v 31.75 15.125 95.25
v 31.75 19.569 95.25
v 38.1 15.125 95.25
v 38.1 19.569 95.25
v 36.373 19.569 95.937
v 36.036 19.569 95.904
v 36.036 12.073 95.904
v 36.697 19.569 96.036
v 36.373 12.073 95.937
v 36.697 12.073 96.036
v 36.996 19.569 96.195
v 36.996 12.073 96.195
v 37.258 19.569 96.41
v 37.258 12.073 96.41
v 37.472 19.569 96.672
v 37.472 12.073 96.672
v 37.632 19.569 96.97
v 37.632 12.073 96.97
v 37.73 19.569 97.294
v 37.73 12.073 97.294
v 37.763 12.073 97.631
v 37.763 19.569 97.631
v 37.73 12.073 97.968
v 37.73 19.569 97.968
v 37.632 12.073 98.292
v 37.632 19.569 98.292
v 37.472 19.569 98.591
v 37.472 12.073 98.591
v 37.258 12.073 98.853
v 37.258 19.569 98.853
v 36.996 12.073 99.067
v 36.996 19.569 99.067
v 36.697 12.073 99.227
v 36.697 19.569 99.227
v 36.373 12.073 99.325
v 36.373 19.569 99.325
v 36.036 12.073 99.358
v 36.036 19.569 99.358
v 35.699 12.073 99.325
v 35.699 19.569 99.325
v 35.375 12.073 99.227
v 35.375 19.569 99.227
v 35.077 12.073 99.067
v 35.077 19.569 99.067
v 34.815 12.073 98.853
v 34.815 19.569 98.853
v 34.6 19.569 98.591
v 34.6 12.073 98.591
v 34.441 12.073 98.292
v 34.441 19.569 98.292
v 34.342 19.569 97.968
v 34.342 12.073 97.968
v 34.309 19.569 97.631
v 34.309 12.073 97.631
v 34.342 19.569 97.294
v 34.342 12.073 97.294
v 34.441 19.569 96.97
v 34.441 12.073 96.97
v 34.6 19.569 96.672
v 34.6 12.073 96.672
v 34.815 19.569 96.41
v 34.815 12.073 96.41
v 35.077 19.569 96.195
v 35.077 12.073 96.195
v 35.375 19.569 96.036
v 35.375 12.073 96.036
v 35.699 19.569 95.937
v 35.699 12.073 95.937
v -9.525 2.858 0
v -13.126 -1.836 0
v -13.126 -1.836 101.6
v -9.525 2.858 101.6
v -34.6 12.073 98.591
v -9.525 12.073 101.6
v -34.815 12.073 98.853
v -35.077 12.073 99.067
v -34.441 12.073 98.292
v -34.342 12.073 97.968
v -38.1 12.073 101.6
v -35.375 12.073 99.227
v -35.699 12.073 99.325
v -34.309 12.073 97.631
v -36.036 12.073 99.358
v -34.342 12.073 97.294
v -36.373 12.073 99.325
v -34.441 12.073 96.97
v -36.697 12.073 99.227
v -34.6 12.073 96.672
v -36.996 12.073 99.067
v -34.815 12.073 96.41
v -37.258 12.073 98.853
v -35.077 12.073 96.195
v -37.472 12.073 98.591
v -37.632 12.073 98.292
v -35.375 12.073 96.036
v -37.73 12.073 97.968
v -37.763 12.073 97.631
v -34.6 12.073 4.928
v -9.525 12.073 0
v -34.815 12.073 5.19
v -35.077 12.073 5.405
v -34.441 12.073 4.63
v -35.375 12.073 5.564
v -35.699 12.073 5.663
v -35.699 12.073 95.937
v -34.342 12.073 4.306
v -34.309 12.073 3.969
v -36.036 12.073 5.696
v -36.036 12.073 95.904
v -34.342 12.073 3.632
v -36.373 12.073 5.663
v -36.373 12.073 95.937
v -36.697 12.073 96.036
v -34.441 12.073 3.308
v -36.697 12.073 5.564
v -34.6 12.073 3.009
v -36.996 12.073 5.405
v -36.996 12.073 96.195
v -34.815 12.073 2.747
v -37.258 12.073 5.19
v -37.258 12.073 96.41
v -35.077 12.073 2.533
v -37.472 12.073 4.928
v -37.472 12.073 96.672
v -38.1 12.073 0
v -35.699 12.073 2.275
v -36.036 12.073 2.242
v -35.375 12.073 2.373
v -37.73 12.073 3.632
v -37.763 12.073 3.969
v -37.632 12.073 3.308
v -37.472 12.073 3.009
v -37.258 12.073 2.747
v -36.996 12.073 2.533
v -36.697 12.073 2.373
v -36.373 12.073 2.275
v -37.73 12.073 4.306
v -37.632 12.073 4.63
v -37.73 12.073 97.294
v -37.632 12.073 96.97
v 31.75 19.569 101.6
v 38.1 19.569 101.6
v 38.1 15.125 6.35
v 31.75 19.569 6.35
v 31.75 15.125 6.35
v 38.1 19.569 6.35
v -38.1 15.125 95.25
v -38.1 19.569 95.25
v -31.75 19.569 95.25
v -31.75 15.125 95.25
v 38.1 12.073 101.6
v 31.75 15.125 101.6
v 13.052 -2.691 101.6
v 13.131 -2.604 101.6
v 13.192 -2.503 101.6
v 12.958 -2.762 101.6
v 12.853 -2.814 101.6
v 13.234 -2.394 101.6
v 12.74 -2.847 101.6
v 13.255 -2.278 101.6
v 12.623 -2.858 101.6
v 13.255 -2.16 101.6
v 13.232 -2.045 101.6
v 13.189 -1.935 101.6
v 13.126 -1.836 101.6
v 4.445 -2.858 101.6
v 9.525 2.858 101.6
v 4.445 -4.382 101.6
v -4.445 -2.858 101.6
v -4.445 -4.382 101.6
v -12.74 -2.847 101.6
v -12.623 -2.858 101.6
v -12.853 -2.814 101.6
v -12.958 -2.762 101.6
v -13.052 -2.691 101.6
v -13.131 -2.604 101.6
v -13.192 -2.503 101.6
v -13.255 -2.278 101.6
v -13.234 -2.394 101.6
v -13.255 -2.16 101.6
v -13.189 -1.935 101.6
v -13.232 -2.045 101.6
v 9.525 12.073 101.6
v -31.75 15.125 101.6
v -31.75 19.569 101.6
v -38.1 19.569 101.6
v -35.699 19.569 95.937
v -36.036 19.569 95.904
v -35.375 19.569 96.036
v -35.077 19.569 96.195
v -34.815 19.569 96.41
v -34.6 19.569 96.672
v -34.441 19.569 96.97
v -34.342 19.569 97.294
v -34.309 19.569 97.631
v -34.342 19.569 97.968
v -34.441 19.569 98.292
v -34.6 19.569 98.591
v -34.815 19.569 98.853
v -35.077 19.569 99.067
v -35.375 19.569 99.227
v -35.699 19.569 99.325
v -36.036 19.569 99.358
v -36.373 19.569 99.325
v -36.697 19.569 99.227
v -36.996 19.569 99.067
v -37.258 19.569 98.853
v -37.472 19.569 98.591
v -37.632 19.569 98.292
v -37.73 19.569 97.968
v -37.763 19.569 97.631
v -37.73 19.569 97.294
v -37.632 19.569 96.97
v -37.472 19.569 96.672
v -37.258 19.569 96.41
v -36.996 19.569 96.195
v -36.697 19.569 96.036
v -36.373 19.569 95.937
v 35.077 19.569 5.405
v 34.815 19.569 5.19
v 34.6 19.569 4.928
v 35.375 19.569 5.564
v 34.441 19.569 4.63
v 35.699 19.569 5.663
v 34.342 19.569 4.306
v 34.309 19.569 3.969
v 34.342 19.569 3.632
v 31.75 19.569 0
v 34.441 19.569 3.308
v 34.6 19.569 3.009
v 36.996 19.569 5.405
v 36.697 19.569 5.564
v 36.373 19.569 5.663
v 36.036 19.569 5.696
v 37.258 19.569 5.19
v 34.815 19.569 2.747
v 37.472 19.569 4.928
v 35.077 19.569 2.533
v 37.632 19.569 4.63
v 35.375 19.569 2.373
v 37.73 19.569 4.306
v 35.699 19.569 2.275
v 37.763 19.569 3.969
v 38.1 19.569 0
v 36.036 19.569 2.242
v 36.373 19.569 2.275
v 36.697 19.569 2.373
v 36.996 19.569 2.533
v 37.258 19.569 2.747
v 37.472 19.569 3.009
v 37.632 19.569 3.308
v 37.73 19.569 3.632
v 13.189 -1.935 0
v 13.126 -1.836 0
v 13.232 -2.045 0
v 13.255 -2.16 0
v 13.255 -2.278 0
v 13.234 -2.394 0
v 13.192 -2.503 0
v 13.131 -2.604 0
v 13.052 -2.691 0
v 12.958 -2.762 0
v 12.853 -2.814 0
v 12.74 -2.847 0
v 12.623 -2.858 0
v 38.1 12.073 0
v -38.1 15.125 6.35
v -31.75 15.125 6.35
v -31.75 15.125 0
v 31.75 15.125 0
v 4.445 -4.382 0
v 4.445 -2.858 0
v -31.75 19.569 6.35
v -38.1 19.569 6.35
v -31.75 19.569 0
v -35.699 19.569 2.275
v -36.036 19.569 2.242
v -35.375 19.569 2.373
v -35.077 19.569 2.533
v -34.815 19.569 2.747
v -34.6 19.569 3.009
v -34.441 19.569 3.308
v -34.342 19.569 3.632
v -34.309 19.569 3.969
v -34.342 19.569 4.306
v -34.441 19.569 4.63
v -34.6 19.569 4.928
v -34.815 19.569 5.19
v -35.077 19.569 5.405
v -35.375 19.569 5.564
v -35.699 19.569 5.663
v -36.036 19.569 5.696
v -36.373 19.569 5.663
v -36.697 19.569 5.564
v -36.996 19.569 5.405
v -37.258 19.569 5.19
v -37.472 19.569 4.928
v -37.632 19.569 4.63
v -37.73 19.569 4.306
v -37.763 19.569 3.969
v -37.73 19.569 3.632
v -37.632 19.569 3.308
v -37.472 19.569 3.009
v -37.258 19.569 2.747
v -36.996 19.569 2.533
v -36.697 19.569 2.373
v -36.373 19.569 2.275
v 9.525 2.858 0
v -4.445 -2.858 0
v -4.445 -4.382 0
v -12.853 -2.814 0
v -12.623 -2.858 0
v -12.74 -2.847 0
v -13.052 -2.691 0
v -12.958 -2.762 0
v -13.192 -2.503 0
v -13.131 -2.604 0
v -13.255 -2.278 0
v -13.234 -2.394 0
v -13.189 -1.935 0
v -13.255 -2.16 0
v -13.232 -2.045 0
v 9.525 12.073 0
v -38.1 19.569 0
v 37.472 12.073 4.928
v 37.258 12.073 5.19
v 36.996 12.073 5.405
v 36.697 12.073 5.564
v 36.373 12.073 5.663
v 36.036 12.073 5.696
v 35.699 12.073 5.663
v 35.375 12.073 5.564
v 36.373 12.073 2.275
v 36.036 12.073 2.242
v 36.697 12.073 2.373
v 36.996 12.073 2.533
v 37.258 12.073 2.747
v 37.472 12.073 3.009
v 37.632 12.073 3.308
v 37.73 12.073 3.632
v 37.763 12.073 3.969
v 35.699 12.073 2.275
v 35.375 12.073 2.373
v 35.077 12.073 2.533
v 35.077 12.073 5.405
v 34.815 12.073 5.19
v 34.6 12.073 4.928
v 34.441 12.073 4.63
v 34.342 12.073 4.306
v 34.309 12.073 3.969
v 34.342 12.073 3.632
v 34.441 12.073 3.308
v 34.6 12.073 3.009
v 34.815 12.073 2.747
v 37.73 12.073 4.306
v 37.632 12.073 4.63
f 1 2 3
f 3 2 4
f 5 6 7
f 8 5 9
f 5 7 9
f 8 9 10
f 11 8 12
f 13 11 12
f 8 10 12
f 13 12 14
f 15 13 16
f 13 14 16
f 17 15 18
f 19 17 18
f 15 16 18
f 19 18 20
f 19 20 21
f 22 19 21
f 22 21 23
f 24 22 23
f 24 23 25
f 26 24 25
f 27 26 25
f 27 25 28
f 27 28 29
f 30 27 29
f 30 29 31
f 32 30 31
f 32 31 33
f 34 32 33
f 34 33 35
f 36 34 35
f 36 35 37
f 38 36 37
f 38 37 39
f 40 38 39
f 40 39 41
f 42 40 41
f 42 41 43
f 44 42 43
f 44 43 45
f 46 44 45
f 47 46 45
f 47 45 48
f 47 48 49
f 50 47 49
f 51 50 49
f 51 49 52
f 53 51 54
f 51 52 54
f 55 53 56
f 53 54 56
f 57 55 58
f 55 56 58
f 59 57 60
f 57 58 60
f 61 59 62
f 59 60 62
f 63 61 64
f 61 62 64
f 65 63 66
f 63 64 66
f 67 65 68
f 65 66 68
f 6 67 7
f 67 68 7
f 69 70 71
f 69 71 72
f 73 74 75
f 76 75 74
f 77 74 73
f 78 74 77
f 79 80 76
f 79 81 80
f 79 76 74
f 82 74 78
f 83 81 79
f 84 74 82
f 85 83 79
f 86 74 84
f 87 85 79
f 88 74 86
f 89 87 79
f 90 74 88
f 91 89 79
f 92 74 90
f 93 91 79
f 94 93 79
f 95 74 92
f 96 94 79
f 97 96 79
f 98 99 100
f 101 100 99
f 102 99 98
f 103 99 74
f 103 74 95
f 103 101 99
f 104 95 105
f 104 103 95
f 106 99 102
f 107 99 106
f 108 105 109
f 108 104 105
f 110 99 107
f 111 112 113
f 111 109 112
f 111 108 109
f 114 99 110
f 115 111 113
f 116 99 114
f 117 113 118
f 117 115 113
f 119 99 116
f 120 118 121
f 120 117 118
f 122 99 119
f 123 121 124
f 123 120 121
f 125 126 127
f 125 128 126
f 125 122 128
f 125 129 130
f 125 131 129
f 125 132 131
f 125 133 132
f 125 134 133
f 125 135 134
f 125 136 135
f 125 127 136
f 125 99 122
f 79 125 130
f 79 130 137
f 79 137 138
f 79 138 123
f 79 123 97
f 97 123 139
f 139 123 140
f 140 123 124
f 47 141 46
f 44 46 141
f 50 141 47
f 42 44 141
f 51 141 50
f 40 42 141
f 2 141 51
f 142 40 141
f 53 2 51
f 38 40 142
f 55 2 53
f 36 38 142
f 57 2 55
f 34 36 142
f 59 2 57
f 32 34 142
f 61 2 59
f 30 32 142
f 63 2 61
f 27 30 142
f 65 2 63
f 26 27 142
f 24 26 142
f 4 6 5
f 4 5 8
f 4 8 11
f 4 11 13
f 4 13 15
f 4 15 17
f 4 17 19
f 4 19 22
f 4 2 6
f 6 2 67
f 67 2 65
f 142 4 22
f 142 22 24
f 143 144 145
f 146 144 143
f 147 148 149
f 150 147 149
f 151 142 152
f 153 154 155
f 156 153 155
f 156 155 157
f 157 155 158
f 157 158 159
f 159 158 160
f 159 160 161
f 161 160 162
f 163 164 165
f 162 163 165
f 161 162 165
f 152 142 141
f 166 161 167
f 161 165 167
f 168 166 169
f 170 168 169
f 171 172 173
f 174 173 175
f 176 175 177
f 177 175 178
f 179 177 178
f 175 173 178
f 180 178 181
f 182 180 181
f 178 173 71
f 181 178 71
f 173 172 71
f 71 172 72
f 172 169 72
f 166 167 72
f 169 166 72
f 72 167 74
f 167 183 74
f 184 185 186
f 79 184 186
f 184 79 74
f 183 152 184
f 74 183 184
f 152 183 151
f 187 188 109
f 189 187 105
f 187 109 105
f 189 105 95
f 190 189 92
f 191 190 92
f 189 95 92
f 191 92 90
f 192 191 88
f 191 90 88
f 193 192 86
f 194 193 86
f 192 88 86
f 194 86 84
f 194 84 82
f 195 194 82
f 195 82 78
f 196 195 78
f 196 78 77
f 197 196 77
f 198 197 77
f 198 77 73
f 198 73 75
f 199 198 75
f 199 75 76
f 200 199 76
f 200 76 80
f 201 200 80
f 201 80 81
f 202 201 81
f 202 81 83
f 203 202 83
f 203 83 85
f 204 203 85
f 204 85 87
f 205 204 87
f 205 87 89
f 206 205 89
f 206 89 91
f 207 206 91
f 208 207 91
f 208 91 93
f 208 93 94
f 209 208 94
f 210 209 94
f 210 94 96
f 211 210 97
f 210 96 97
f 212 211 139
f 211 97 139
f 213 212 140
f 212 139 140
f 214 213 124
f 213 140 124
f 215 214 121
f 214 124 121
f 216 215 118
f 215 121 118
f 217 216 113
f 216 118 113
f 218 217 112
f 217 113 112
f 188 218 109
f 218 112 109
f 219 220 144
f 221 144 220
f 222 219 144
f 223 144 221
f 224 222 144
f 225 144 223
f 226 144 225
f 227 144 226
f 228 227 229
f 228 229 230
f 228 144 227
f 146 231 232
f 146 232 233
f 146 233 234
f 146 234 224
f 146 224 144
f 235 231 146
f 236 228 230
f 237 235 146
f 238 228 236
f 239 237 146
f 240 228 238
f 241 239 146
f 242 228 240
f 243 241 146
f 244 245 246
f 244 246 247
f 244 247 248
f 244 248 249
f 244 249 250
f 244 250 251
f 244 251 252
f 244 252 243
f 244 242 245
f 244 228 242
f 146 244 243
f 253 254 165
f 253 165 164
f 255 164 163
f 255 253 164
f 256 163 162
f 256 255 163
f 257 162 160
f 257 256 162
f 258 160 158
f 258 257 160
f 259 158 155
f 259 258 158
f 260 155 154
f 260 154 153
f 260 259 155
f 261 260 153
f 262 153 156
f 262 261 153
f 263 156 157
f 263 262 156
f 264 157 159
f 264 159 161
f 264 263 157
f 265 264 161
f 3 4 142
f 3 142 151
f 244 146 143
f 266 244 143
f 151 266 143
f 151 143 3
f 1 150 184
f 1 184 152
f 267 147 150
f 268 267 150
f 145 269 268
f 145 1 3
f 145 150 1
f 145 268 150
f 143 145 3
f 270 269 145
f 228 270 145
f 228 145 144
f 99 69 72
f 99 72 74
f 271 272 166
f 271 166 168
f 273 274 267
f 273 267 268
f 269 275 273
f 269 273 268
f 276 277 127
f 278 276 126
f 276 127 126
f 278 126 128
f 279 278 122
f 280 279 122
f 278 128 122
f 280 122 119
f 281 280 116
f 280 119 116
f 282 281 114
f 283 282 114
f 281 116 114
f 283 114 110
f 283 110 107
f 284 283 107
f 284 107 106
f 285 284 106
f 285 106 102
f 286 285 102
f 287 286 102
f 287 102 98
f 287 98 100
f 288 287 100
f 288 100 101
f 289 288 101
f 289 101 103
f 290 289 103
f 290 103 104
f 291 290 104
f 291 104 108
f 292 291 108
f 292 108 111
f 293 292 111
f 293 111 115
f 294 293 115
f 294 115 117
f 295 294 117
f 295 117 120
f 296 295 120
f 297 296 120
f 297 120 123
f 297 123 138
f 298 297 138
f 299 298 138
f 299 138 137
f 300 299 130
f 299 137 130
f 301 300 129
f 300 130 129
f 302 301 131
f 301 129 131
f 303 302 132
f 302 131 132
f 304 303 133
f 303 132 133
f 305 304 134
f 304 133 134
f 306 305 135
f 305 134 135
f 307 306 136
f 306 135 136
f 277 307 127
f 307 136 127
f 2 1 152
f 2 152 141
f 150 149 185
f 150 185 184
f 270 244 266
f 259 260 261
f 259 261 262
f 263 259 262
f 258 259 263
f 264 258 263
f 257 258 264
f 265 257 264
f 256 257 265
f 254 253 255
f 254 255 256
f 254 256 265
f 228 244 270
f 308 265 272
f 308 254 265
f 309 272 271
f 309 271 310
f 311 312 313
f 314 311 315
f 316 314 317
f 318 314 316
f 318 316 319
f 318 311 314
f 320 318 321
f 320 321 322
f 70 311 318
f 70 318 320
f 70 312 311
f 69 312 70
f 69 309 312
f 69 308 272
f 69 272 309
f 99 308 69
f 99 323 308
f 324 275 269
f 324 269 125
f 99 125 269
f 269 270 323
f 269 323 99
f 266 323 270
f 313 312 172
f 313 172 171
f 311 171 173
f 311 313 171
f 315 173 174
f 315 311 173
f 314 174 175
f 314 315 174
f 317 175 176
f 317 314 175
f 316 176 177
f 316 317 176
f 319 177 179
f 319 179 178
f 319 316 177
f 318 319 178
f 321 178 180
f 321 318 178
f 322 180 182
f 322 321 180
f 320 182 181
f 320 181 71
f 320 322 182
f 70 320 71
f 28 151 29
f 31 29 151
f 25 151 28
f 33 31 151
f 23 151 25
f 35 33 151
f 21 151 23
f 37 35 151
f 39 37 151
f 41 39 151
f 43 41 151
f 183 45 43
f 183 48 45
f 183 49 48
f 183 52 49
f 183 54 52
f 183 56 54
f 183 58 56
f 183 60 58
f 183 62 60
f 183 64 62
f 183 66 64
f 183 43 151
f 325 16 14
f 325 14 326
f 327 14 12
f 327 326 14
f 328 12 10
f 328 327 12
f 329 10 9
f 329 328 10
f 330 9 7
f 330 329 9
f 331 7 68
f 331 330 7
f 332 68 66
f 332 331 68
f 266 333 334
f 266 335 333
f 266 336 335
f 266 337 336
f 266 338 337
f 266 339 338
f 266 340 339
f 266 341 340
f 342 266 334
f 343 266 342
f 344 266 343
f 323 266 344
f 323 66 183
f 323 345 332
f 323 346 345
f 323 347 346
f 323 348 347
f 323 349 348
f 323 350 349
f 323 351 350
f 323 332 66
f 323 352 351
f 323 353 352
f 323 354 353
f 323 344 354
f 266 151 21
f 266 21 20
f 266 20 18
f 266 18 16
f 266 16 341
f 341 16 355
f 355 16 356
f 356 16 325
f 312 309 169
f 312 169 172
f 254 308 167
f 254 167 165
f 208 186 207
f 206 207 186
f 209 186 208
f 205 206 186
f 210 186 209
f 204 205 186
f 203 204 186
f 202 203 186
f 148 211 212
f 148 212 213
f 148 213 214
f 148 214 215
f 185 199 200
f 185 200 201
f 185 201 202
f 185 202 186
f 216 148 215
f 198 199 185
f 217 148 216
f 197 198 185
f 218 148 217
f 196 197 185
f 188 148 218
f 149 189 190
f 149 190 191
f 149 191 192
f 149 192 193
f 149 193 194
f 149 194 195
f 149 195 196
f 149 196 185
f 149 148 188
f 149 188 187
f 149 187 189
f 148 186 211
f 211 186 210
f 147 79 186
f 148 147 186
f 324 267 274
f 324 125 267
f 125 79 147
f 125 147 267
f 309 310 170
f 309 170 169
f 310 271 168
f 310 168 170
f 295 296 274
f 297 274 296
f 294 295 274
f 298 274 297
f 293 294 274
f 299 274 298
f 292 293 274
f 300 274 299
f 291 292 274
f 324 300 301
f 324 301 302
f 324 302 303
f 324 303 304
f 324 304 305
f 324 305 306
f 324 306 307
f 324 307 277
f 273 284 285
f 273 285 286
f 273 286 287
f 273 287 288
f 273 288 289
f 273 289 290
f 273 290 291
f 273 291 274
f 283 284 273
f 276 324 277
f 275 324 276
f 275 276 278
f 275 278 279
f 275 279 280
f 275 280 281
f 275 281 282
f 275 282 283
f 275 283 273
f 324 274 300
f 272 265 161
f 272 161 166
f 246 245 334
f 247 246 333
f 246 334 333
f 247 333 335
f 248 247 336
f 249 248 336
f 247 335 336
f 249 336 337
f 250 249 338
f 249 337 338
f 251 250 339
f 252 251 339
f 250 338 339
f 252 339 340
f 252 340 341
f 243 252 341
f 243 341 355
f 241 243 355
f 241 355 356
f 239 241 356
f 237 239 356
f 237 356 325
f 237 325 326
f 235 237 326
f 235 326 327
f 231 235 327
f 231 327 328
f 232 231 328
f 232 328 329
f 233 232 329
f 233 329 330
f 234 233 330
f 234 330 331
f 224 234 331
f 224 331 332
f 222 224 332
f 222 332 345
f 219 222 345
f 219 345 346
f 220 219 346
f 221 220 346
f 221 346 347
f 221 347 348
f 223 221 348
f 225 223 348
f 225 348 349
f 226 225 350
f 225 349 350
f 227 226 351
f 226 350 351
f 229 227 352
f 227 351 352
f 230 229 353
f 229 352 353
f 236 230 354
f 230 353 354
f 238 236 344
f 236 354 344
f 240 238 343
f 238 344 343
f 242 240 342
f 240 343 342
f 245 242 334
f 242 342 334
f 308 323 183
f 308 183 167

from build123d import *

# Parameters (mm, degrees)
BOSS_EXTRUDE1_DEPTH   = 101.6
SKETCH4_W             = 6.35
SKETCH4_H             = 88.9
CUT_EXTRUDE1_DEPTH    = 4.444119865
SKETCH5_W             = 6.35
SKETCH5_H             = 88.9
CUT_EXTRUDE2_DEPTH    = 4.444119865
F_4_CLEARANCE_HOLE1_D = 3.4544
F_4_CLEARANCE_HOLE2_D = 3.4544
F_4_CLEARANCE_HOLE3_D = 3.4544
F_4_CLEARANCE_HOLE4_D = 3.4544


with BuildPart() as part:
    # Sketch1 → Boss-Extrude1 (new body)
    with BuildSketch(Plane.XY):
        with BuildLine():
            Line((-9.525, 2.8575), (-9.525, 4.453010906))
            Line((-9.525, 4.453010906), (-9.525, 12.073010906))
            Line((-9.525, 12.073010906), (-38.1, 12.073010906))
            Line((-38.1, 12.073010906), (-38.1, 19.568949913))
            Line((-38.1, 19.568949913), (-31.75, 19.568949913))
            Line((-31.75, 19.568949913), (-31.75, 15.124830048))
            Line((-31.75, 15.124830048), (31.75, 15.124830048))
            Line((31.75, 15.124830048), (31.75, 19.568949913))
            Line((31.75, 19.568949913), (38.1, 19.568949913))
            Line((38.1, 19.568949913), (38.1, 12.073010906))
            Line((38.1, 12.073010906), (9.525, 12.073010906))
            Line((9.525, 12.073010906), (9.525, 4.453010906))
            Line((9.525, 4.453010906), (9.525, 2.8575))
            Line((9.525, 2.8575), (13.126400516, -1.835936531))
            ThreePointArc((13.126400516, -1.835936531), (13.192135312, -2.503353309), (12.622621186, -2.8575))
            Line((12.622621186, -2.8575), (9.525, -2.8575))
            Line((9.525, -2.8575), (4.445, -2.8575))
            Line((4.445, -2.8575), (4.445, -4.3815))
            Line((4.445, -4.3815), (-4.445, -4.3815))
            Line((-4.445, -4.3815), (-4.445, -2.8575))
            Line((-4.445, -2.8575), (-9.525, -2.8575))
            Line((-9.525, -2.8575), (-12.622621186, -2.8575))
            ThreePointArc((-12.622621186, -2.8575), (-13.192135312, -2.503353309), (-13.126400516, -1.835936531))
            Line((-13.126400516, -1.835936531), (-9.525, 2.8575))
        make_face()
    extrude(amount=BOSS_EXTRUDE1_DEPTH)

    # Sketch4 → Cut-Extrude1 (cut)
    with BuildSketch(Plane(origin=(0, 19.568949913, 0), x_dir=(1, 0, 0), z_dir=(0, 1, 0))):
        with Locations((-34.925, -50.8)):
            Rectangle(SKETCH4_W, SKETCH4_H)
    extrude(amount=-CUT_EXTRUDE1_DEPTH, mode=Mode.SUBTRACT)

    # Sketch5 → Cut-Extrude2 (cut)
    with BuildSketch(Plane(origin=(0, 19.568949913, 0), x_dir=(1, 0, 0), z_dir=(0, 1, 0))):
        with Locations((34.925, -50.8)):
            Rectangle(SKETCH5_W, SKETCH5_H)
    extrude(amount=-CUT_EXTRUDE2_DEPTH, mode=Mode.SUBTRACT)

    # #4 Clearance Hole1 (through all)
    with Locations(Plane(origin=(-36.03625, 19.568949913, 3.96875), x_dir=(0, 0, 1), z_dir=(0, 1, 0))):
        with Locations((0, 0)):
            Hole(F_4_CLEARANCE_HOLE1_D / 2)

    # #4 Clearance Hole2 (through all)
    with Locations(Plane(origin=(36.03625, 19.568949913, 3.96875), x_dir=(0, 0, 1), z_dir=(0, 1, 0))):
        with Locations((0, 0)):
            Hole(F_4_CLEARANCE_HOLE2_D / 2)

    # #4 Clearance Hole3 (through all)
    with Locations(Plane(origin=(-36.03625, 19.568949913, 97.63125), x_dir=(0, 0, 1), z_dir=(0, 1, 0))):
        with Locations((0, 0)):
            Hole(F_4_CLEARANCE_HOLE3_D / 2)

    # #4 Clearance Hole4 (through all)
    with Locations(Plane(origin=(36.03625, 19.568949913, 97.63125), x_dir=(0, 0, 1), z_dir=(0, 1, 0))):
        with Locations((0, 0)):
            Hole(F_4_CLEARANCE_HOLE4_D / 2)


solid = part.part
